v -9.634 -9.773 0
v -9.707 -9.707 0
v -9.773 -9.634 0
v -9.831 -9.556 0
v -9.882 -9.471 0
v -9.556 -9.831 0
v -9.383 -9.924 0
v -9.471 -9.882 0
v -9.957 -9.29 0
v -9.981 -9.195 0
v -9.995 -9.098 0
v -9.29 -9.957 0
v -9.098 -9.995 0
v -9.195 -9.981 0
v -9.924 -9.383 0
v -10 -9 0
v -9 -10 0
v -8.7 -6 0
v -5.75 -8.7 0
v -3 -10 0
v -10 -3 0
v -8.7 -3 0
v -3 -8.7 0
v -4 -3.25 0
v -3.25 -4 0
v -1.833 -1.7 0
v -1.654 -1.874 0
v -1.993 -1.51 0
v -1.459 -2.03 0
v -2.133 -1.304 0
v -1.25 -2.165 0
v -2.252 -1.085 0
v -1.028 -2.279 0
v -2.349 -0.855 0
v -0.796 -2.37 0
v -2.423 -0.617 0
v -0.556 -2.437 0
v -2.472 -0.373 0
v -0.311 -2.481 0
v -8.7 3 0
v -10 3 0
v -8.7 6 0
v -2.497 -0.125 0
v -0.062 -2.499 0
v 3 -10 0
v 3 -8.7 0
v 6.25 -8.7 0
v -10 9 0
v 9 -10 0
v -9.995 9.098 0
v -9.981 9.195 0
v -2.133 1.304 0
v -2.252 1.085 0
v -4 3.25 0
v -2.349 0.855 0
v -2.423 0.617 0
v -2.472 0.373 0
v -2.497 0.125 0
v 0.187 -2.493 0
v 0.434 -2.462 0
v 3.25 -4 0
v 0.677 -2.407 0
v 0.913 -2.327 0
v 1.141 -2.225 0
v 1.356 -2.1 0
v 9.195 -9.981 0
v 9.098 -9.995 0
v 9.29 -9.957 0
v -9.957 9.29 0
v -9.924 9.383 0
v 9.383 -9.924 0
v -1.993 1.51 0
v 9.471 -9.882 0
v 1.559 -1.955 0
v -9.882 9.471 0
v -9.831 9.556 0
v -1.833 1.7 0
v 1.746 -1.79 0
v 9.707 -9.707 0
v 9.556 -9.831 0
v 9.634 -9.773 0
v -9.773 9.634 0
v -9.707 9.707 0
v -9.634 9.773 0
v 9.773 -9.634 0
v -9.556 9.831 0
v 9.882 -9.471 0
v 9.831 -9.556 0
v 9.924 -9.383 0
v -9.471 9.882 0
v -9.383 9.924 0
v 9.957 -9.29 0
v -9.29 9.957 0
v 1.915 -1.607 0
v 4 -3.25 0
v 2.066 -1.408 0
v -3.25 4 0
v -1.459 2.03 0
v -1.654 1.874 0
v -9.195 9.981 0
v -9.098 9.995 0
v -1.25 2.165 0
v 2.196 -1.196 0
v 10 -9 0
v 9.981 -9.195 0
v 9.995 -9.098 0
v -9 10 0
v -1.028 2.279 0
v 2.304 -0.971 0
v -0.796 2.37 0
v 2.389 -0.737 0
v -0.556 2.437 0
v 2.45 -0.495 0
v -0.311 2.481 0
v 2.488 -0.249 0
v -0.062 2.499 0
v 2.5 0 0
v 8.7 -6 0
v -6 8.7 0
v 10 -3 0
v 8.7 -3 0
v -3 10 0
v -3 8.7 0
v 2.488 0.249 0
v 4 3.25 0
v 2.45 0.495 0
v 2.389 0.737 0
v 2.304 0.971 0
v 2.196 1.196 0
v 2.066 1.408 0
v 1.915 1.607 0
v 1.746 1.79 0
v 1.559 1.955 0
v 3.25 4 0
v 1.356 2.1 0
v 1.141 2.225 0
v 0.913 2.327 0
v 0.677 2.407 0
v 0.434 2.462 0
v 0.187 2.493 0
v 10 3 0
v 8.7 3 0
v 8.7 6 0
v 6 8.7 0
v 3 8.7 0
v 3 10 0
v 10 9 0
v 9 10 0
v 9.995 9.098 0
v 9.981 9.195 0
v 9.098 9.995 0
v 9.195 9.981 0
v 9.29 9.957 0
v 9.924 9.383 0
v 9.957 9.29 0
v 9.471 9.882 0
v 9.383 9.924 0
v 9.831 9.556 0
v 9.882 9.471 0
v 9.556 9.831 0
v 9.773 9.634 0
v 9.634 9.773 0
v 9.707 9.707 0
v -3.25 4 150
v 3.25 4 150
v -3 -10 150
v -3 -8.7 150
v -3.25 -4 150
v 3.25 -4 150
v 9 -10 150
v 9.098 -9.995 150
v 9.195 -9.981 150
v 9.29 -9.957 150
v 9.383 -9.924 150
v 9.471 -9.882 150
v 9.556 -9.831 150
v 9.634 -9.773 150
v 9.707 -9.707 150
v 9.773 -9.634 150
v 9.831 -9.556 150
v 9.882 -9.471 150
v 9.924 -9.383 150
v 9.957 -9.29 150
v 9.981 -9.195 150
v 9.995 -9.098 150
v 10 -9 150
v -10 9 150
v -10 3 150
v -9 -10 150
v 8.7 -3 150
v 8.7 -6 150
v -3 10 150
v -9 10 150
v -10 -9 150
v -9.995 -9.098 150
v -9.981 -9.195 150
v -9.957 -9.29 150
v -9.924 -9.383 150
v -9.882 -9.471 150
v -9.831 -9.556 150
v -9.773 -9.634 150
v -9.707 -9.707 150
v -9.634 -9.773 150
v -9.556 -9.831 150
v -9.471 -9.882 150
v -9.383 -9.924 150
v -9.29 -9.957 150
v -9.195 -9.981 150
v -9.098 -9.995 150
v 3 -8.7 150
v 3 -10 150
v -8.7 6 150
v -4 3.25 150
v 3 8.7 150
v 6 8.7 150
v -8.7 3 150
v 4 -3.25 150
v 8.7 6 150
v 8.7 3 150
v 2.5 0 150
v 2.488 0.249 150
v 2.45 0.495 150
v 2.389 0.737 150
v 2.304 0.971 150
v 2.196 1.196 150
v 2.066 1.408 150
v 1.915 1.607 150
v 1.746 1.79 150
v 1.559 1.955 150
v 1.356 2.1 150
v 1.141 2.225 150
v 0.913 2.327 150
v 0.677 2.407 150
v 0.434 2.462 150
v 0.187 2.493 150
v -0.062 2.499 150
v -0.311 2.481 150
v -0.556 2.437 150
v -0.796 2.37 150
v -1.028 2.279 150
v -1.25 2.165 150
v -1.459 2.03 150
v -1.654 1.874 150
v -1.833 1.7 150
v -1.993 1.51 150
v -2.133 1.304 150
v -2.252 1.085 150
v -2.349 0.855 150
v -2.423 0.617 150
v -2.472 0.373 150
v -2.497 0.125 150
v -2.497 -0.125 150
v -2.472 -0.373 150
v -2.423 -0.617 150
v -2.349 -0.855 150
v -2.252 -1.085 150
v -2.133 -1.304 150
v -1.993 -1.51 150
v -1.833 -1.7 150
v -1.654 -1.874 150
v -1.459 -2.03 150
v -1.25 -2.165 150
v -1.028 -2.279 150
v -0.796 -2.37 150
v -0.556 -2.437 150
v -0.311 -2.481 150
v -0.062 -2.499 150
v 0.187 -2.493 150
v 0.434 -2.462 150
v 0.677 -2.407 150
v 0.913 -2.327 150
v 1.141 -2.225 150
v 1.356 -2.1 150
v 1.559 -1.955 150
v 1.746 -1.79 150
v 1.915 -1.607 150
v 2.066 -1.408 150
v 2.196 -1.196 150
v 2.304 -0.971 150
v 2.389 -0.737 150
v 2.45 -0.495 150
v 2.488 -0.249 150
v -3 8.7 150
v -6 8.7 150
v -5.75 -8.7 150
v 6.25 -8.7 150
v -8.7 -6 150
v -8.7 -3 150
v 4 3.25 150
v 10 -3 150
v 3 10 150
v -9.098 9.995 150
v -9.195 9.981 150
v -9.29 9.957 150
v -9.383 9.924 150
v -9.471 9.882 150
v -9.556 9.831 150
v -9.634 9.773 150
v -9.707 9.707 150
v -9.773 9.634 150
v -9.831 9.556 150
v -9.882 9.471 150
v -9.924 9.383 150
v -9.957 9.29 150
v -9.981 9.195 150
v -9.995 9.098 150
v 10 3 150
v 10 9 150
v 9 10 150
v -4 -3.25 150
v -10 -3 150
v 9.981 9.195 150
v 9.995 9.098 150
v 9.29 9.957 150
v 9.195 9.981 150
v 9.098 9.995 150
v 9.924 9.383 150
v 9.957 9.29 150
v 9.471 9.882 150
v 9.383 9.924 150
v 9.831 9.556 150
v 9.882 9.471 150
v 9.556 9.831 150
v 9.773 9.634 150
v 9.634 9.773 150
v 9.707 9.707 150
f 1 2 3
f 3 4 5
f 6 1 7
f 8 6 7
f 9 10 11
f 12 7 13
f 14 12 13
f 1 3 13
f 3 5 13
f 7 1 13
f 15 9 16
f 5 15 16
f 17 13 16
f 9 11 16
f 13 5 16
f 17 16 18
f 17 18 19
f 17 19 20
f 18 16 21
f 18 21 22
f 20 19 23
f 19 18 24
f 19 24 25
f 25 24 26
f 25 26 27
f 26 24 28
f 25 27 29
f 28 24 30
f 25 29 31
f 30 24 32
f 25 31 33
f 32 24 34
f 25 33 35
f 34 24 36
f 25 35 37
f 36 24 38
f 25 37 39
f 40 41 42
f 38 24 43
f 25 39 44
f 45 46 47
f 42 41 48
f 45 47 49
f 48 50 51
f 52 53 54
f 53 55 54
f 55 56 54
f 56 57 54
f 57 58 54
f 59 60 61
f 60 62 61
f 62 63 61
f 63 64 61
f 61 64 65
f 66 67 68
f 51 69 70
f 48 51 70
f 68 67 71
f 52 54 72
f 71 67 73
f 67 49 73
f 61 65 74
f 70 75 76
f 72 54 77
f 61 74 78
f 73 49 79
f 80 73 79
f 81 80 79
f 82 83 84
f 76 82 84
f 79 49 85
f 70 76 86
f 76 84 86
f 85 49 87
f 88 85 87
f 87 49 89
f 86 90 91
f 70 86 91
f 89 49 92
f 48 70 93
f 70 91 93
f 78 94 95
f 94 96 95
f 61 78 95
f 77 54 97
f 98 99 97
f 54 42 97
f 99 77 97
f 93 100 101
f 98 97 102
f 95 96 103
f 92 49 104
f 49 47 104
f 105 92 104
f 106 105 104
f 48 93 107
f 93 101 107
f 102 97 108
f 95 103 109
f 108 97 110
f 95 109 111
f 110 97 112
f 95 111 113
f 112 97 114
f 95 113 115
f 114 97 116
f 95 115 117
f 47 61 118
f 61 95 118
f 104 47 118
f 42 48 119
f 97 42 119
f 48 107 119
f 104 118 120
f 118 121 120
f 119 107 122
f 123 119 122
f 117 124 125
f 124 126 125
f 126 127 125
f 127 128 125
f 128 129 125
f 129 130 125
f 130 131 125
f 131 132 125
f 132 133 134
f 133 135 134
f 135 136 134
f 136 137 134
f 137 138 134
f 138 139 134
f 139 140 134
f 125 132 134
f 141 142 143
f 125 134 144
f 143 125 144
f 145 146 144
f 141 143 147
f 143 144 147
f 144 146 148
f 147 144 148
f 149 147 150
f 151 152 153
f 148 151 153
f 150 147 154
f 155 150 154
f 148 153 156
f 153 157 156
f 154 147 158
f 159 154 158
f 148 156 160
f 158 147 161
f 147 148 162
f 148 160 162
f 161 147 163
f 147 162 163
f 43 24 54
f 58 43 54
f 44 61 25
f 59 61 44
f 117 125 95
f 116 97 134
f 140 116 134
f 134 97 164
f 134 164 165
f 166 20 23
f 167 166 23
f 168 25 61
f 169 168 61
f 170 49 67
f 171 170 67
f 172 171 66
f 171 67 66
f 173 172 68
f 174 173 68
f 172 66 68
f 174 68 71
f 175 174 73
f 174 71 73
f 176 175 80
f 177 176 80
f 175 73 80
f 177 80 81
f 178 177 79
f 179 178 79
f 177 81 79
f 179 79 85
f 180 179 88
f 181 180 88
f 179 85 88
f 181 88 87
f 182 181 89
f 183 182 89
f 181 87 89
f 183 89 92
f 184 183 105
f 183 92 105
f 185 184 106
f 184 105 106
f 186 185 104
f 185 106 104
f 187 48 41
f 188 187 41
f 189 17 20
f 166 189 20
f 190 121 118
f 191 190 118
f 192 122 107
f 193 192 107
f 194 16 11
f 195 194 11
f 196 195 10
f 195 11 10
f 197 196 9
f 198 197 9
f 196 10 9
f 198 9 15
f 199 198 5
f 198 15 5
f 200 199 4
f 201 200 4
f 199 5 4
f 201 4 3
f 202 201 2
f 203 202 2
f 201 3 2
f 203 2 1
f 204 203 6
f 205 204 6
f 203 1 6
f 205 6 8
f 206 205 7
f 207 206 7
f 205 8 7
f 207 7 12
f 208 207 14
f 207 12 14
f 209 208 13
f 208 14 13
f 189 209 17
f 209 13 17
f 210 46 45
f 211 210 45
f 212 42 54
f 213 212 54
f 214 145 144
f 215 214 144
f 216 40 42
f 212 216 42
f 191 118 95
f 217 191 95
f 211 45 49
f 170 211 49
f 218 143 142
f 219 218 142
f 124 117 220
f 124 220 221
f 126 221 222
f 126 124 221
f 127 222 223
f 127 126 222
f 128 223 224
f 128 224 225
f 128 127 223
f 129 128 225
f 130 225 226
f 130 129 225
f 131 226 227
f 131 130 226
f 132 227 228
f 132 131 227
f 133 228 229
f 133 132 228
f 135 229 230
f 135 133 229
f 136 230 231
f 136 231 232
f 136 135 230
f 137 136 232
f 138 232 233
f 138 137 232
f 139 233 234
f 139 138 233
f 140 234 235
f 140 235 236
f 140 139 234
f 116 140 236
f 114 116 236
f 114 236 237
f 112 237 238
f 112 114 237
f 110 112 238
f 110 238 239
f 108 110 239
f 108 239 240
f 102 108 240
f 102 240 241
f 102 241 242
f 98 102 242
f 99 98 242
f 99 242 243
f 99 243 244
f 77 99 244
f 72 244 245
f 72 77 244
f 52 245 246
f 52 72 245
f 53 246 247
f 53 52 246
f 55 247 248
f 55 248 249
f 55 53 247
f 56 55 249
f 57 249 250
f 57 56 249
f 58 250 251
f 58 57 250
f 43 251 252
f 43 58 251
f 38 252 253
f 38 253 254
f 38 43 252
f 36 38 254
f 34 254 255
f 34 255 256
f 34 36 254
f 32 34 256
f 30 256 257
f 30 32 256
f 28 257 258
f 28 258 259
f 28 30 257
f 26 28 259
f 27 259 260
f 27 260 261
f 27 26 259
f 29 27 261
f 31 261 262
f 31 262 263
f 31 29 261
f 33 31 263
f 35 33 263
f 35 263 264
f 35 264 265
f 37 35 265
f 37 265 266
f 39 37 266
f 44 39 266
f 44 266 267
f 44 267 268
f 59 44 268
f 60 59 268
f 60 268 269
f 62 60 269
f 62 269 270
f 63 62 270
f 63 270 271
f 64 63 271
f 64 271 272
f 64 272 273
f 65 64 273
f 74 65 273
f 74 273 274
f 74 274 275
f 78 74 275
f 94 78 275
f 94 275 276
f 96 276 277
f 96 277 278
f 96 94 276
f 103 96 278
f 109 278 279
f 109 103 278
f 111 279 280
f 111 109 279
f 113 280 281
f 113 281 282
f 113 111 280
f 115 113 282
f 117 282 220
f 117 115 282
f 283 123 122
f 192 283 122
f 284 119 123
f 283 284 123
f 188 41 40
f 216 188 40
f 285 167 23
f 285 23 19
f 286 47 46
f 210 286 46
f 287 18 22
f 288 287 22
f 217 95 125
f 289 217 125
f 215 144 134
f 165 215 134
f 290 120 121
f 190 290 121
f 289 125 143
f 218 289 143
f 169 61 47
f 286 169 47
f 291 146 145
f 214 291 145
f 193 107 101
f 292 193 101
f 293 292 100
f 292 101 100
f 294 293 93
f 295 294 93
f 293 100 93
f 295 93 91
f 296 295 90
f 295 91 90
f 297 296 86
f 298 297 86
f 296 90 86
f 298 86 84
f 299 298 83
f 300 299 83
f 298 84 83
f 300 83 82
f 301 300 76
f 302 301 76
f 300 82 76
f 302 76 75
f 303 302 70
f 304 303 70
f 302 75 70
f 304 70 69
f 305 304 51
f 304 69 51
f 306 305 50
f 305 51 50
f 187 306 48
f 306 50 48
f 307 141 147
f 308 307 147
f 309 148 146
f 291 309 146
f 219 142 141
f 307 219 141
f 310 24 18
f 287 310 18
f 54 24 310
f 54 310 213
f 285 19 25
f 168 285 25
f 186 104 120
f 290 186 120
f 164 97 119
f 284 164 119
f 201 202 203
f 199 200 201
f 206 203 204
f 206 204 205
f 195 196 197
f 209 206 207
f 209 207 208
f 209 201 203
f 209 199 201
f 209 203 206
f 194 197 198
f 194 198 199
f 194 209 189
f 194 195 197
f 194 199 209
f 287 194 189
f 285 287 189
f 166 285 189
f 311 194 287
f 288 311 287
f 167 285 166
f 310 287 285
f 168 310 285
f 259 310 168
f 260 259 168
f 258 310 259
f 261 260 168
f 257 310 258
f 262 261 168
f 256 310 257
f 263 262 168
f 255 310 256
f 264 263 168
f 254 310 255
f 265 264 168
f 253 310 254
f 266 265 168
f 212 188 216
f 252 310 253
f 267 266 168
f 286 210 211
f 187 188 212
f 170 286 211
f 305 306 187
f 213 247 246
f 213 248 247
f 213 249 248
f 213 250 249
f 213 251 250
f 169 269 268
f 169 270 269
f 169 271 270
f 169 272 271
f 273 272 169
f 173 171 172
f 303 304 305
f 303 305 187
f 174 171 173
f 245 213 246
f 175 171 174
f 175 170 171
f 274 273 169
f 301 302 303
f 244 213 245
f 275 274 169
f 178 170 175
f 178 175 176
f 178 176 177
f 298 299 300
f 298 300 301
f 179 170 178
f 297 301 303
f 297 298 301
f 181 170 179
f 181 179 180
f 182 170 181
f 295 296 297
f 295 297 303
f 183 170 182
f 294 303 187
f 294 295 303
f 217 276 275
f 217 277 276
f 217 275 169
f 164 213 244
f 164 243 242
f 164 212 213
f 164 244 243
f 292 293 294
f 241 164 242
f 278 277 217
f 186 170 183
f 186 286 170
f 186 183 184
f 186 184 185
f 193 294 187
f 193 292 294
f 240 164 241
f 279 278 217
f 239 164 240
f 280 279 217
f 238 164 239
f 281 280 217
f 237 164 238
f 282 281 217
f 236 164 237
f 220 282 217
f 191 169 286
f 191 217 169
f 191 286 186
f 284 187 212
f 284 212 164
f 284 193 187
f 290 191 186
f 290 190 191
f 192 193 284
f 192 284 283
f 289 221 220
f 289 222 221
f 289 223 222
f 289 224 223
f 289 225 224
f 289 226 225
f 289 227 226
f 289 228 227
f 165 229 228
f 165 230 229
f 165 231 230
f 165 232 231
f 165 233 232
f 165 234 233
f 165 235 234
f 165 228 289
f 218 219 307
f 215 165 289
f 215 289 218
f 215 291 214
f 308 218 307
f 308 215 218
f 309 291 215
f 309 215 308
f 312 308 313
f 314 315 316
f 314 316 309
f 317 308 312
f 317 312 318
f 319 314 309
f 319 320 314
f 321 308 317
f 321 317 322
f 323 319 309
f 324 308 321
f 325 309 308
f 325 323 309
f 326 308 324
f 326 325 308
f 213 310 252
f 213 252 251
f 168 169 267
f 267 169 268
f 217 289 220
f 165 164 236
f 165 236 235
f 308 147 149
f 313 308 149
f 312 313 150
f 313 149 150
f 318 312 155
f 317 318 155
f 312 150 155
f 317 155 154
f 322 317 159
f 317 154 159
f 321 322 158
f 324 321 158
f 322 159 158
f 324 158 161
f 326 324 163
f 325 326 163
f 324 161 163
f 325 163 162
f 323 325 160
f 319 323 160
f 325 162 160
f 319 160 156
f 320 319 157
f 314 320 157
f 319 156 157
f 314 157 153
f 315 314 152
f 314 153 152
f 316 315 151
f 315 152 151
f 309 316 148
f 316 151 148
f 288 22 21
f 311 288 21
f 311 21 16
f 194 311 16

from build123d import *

# Parameters (mm, degrees)
CROQUIS1_W              = 8
CROQUIS1_H              = 8
CROQUIS1_R              = 2.5
SALIENTE_EXTRUIR4_DEPTH = 150


with BuildPart() as part:
    # Croquis1 → Saliente-Extruir4 (new body)
    with BuildSketch(Plane.XY):
        with BuildLine():
            Line((-3, 8.7), (-3, 10))
            Line((-3, 10), (-9, 10))
            ThreePointArc((-9, 10), (-9.707106781, 9.707106781), (-10, 9))
            Line((-10, 9), (-10, 3))
            Line((-10, 3), (-8.7, 3))
            Line((-8.7, 3), (-8.7, 6))
            Line((-8.7, 6), (-4, 3.25))
            Line((-4, 3.25), (-4, 4))
            Line((-4, 4), (-3.25, 4))
            Line((-3.25, 4), (-6, 8.7))
            Line((-6, 8.7), (-3, 8.7))
        make_face()
        with BuildLine():
            Line((9, 10), (3, 10))
            Line((3, 10), (3, 8.7))
            Line((3, 8.7), (6, 8.7))
            Line((6, 8.7), (3.25, 4))
            Line((3.25, 4), (4, 4))
            Line((4, 4), (4, 3.25))
            Line((4, 3.25), (8.7, 6))
            Line((8.7, 6), (8.7, 3))
            Line((8.7, 3), (10, 3))
            Line((10, 3), (10, 9))
            ThreePointArc((10, 9), (9.707106781, 9.707106781), (9, 10))
        make_face()
        with BuildLine():
            Line((10, -9), (10, -3))
            Line((10, -3), (8.7, -3))
            Line((8.7, -3), (8.7, -6))
            Line((8.7, -6), (4, -3.25))
            Line((4, -3.25), (4, -4))
            Line((4, -4), (3.25, -4))
            Line((3.25, -4), (6.25, -8.7))
            Line((6.25, -8.7), (3, -8.7))
            Line((3, -8.7), (3, -10))
            Line((3, -10), (9, -10))
            ThreePointArc((9, -10), (9.707106781, -9.707106781), (10, -9))
        make_face()
        with BuildLine():
            Line((-8.7, -3), (-10, -3))
            Line((-10, -3), (-10, -9))
            ThreePointArc((-10, -9), (-9.707106781, -9.707106781), (-9, -10))
            Line((-9, -10), (-3, -10))
            Line((-3, -10), (-3, -8.7))
            Line((-3, -8.7), (-5.75, -8.7))
            Line((-5.75, -8.7), (-3.25, -4))
            Line((-3.25, -4), (-4, -4))
            Line((-4, -4), (-4, -3.25))
            Line((-4, -3.25), (-8.7, -6))
            Line((-8.7, -6), (-8.7, -3))
        make_face()
        Rectangle(CROQUIS1_W, CROQUIS1_H)
        Circle(CROQUIS1_R, mode=Mode.SUBTRACT)
    extrude(amount=SALIENTE_EXTRUIR4_DEPTH)


solid = part.part
